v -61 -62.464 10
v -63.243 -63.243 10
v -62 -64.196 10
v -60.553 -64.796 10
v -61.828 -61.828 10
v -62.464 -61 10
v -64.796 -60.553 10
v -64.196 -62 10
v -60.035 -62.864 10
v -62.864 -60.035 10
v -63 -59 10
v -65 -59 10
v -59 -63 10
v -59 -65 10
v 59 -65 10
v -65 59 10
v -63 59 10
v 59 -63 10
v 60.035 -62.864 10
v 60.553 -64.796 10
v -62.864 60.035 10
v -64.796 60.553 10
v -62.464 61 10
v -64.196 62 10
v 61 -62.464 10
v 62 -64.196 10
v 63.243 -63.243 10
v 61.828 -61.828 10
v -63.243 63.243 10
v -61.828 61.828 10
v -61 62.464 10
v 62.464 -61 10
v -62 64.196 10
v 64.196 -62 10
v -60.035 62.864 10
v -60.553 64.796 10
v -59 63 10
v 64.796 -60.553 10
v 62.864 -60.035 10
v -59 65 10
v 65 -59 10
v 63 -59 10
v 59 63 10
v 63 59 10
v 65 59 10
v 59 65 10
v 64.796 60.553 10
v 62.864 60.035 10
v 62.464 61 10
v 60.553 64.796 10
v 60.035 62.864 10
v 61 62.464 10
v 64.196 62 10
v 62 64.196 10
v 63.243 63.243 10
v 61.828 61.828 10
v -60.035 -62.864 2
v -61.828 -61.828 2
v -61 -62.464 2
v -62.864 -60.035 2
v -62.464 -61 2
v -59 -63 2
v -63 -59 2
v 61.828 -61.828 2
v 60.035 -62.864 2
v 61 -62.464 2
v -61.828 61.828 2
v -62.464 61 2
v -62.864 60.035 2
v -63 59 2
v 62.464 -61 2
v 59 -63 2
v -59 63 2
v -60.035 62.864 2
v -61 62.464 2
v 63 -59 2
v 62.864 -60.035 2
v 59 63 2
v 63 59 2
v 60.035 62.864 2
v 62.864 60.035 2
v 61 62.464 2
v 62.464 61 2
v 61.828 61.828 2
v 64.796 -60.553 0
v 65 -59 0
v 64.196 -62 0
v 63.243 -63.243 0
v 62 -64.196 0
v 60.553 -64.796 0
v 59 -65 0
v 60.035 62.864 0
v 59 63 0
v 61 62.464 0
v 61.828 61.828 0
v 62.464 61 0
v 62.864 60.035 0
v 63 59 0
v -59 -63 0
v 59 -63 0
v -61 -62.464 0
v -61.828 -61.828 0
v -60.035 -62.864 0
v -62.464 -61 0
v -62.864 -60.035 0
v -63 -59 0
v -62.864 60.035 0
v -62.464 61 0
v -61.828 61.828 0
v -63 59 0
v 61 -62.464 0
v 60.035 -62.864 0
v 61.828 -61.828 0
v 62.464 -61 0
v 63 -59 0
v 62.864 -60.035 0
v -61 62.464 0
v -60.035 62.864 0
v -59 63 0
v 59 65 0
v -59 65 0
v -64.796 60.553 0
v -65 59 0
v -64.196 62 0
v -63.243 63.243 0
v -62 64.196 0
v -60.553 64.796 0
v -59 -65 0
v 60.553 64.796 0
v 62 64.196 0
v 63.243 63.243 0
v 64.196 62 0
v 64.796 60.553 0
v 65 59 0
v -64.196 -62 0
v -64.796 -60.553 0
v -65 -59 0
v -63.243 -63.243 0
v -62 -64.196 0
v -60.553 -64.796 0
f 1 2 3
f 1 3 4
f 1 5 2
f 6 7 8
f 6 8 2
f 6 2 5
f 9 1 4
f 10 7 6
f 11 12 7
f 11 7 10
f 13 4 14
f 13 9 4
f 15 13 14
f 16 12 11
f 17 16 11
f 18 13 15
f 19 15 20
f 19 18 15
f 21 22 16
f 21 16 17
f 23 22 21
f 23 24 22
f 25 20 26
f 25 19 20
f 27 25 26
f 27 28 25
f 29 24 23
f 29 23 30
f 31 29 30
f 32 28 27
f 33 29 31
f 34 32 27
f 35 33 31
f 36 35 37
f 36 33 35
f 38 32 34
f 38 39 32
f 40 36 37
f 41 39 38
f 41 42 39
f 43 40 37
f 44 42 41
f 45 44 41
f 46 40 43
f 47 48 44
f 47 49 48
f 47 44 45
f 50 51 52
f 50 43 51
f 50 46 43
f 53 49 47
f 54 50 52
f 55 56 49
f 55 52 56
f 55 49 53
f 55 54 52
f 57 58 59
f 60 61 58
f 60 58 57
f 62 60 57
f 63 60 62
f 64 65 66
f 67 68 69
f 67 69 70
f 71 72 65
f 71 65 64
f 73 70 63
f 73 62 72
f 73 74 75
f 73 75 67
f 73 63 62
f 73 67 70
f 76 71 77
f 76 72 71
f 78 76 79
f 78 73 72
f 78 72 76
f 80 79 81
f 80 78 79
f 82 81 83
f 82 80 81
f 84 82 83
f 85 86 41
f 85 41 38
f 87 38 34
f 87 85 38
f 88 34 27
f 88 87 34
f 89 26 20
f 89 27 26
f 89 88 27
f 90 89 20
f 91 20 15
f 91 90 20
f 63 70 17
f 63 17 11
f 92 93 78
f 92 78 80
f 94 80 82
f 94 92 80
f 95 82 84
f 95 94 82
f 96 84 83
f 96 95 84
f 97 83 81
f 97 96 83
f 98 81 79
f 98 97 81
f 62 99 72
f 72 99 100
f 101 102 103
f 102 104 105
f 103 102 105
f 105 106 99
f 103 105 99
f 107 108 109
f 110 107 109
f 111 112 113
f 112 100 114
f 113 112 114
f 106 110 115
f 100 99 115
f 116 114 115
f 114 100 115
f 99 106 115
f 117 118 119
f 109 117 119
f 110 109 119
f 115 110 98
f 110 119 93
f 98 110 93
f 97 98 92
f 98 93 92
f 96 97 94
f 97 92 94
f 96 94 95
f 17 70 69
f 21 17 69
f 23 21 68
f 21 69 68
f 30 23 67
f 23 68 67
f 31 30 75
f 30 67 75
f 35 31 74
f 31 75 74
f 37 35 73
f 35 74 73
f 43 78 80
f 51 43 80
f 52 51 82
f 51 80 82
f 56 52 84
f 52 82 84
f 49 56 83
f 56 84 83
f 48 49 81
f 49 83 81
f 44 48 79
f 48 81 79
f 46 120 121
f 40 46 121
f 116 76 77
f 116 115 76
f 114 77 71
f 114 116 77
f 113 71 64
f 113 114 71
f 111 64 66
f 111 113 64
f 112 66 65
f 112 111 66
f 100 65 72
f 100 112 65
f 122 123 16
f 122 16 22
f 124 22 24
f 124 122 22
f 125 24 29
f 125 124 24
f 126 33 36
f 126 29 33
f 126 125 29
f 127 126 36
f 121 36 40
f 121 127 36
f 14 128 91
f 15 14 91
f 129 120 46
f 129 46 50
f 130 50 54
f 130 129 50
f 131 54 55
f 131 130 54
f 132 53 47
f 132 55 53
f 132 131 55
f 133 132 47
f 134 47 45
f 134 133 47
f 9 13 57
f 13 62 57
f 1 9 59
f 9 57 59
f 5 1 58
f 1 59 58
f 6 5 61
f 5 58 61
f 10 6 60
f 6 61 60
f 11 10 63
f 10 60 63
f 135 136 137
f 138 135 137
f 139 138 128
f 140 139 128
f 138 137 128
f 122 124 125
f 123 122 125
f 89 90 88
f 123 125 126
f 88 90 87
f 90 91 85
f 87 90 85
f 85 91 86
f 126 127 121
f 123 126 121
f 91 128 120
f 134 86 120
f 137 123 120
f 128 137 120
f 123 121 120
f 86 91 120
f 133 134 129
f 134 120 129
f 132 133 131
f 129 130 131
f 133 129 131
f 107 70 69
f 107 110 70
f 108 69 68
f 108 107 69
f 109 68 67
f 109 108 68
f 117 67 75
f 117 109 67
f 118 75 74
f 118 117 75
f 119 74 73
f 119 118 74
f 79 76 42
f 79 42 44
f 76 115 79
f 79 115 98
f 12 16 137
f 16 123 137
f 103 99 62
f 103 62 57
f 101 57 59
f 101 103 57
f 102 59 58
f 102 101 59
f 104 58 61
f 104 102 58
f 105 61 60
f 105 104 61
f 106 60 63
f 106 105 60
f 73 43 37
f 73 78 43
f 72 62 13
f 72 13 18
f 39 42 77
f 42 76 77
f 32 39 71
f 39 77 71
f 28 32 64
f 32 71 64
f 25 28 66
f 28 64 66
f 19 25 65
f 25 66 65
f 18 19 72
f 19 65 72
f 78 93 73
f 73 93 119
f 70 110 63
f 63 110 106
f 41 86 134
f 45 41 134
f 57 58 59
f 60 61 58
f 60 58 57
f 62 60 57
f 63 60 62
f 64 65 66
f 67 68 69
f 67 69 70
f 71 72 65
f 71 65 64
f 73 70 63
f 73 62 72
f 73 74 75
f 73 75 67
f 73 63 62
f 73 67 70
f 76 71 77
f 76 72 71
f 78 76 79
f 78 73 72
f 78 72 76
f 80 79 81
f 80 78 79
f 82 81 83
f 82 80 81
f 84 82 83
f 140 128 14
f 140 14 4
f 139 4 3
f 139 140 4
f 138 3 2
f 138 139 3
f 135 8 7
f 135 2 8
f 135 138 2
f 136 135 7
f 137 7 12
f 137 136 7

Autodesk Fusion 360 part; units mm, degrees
sketch "Bottom and Walls" plane through (0, 0, 0) normal (0, 0, 1) x (1, 0, 0)
  line L0 (59, 65) -> (-59, 65)
  line L1 (-65, 59) -> (-65, -59)
  line L2 (-59, -65) -> (59, -65)
  line L3 (65, -59) -> (65, 59)
  line L4 (65, 65) -> (-65, -65) construction
  line L5 (-65, 65) -> (65, -65) construction
  arc A0 (-59, 65) -> (-65, 59) centre (-59, 59) ccw
  arc A1 (65, 59) -> (59, 65) centre (59, 59) ccw
  arc A2 (59, -65) -> (65, -59) centre (59, -59) ccw
  arc A3 (-65, -59) -> (-59, -65) centre (-59, -59) ccw
  line L6 (-63, 59) -> (-63, -59)
  arc A4 (-63, -59) -> (-59, -63) centre (-59, -59) ccw
  line L7 (-59, -63) -> (59, -63)
  arc A5 (59, -63) -> (63, -59) centre (59, -59) ccw
  line L8 (63, -59) -> (63, 59)
  arc A6 (63, 59) -> (59, 63) centre (59, 59) ccw
  line L9 (59, 63) -> (-59, 63)
  arc A7 (-59, 63) -> (-63, 59) centre (-59, 59) ccw
  dimension "d6" = 130
  dimension "d7" = 130
  dimension "d8" = 6
  dimension "d9" = -2
extrude "Extrude2" add sketch "Bottom and Walls" along normal blind 10 makes body 1
extrude "Extrude3" add sketch "Bottom and Walls" along normal blind 2 contours L6 A4 L7 A5 L8 A6 L9 A7 bodies 1
extrude "Extrude4" add sketch "Bottom and Walls" along normal blind 2 separate body contours L6 A4 L7 A5 L8 A6 L9 A7 makes body 2
